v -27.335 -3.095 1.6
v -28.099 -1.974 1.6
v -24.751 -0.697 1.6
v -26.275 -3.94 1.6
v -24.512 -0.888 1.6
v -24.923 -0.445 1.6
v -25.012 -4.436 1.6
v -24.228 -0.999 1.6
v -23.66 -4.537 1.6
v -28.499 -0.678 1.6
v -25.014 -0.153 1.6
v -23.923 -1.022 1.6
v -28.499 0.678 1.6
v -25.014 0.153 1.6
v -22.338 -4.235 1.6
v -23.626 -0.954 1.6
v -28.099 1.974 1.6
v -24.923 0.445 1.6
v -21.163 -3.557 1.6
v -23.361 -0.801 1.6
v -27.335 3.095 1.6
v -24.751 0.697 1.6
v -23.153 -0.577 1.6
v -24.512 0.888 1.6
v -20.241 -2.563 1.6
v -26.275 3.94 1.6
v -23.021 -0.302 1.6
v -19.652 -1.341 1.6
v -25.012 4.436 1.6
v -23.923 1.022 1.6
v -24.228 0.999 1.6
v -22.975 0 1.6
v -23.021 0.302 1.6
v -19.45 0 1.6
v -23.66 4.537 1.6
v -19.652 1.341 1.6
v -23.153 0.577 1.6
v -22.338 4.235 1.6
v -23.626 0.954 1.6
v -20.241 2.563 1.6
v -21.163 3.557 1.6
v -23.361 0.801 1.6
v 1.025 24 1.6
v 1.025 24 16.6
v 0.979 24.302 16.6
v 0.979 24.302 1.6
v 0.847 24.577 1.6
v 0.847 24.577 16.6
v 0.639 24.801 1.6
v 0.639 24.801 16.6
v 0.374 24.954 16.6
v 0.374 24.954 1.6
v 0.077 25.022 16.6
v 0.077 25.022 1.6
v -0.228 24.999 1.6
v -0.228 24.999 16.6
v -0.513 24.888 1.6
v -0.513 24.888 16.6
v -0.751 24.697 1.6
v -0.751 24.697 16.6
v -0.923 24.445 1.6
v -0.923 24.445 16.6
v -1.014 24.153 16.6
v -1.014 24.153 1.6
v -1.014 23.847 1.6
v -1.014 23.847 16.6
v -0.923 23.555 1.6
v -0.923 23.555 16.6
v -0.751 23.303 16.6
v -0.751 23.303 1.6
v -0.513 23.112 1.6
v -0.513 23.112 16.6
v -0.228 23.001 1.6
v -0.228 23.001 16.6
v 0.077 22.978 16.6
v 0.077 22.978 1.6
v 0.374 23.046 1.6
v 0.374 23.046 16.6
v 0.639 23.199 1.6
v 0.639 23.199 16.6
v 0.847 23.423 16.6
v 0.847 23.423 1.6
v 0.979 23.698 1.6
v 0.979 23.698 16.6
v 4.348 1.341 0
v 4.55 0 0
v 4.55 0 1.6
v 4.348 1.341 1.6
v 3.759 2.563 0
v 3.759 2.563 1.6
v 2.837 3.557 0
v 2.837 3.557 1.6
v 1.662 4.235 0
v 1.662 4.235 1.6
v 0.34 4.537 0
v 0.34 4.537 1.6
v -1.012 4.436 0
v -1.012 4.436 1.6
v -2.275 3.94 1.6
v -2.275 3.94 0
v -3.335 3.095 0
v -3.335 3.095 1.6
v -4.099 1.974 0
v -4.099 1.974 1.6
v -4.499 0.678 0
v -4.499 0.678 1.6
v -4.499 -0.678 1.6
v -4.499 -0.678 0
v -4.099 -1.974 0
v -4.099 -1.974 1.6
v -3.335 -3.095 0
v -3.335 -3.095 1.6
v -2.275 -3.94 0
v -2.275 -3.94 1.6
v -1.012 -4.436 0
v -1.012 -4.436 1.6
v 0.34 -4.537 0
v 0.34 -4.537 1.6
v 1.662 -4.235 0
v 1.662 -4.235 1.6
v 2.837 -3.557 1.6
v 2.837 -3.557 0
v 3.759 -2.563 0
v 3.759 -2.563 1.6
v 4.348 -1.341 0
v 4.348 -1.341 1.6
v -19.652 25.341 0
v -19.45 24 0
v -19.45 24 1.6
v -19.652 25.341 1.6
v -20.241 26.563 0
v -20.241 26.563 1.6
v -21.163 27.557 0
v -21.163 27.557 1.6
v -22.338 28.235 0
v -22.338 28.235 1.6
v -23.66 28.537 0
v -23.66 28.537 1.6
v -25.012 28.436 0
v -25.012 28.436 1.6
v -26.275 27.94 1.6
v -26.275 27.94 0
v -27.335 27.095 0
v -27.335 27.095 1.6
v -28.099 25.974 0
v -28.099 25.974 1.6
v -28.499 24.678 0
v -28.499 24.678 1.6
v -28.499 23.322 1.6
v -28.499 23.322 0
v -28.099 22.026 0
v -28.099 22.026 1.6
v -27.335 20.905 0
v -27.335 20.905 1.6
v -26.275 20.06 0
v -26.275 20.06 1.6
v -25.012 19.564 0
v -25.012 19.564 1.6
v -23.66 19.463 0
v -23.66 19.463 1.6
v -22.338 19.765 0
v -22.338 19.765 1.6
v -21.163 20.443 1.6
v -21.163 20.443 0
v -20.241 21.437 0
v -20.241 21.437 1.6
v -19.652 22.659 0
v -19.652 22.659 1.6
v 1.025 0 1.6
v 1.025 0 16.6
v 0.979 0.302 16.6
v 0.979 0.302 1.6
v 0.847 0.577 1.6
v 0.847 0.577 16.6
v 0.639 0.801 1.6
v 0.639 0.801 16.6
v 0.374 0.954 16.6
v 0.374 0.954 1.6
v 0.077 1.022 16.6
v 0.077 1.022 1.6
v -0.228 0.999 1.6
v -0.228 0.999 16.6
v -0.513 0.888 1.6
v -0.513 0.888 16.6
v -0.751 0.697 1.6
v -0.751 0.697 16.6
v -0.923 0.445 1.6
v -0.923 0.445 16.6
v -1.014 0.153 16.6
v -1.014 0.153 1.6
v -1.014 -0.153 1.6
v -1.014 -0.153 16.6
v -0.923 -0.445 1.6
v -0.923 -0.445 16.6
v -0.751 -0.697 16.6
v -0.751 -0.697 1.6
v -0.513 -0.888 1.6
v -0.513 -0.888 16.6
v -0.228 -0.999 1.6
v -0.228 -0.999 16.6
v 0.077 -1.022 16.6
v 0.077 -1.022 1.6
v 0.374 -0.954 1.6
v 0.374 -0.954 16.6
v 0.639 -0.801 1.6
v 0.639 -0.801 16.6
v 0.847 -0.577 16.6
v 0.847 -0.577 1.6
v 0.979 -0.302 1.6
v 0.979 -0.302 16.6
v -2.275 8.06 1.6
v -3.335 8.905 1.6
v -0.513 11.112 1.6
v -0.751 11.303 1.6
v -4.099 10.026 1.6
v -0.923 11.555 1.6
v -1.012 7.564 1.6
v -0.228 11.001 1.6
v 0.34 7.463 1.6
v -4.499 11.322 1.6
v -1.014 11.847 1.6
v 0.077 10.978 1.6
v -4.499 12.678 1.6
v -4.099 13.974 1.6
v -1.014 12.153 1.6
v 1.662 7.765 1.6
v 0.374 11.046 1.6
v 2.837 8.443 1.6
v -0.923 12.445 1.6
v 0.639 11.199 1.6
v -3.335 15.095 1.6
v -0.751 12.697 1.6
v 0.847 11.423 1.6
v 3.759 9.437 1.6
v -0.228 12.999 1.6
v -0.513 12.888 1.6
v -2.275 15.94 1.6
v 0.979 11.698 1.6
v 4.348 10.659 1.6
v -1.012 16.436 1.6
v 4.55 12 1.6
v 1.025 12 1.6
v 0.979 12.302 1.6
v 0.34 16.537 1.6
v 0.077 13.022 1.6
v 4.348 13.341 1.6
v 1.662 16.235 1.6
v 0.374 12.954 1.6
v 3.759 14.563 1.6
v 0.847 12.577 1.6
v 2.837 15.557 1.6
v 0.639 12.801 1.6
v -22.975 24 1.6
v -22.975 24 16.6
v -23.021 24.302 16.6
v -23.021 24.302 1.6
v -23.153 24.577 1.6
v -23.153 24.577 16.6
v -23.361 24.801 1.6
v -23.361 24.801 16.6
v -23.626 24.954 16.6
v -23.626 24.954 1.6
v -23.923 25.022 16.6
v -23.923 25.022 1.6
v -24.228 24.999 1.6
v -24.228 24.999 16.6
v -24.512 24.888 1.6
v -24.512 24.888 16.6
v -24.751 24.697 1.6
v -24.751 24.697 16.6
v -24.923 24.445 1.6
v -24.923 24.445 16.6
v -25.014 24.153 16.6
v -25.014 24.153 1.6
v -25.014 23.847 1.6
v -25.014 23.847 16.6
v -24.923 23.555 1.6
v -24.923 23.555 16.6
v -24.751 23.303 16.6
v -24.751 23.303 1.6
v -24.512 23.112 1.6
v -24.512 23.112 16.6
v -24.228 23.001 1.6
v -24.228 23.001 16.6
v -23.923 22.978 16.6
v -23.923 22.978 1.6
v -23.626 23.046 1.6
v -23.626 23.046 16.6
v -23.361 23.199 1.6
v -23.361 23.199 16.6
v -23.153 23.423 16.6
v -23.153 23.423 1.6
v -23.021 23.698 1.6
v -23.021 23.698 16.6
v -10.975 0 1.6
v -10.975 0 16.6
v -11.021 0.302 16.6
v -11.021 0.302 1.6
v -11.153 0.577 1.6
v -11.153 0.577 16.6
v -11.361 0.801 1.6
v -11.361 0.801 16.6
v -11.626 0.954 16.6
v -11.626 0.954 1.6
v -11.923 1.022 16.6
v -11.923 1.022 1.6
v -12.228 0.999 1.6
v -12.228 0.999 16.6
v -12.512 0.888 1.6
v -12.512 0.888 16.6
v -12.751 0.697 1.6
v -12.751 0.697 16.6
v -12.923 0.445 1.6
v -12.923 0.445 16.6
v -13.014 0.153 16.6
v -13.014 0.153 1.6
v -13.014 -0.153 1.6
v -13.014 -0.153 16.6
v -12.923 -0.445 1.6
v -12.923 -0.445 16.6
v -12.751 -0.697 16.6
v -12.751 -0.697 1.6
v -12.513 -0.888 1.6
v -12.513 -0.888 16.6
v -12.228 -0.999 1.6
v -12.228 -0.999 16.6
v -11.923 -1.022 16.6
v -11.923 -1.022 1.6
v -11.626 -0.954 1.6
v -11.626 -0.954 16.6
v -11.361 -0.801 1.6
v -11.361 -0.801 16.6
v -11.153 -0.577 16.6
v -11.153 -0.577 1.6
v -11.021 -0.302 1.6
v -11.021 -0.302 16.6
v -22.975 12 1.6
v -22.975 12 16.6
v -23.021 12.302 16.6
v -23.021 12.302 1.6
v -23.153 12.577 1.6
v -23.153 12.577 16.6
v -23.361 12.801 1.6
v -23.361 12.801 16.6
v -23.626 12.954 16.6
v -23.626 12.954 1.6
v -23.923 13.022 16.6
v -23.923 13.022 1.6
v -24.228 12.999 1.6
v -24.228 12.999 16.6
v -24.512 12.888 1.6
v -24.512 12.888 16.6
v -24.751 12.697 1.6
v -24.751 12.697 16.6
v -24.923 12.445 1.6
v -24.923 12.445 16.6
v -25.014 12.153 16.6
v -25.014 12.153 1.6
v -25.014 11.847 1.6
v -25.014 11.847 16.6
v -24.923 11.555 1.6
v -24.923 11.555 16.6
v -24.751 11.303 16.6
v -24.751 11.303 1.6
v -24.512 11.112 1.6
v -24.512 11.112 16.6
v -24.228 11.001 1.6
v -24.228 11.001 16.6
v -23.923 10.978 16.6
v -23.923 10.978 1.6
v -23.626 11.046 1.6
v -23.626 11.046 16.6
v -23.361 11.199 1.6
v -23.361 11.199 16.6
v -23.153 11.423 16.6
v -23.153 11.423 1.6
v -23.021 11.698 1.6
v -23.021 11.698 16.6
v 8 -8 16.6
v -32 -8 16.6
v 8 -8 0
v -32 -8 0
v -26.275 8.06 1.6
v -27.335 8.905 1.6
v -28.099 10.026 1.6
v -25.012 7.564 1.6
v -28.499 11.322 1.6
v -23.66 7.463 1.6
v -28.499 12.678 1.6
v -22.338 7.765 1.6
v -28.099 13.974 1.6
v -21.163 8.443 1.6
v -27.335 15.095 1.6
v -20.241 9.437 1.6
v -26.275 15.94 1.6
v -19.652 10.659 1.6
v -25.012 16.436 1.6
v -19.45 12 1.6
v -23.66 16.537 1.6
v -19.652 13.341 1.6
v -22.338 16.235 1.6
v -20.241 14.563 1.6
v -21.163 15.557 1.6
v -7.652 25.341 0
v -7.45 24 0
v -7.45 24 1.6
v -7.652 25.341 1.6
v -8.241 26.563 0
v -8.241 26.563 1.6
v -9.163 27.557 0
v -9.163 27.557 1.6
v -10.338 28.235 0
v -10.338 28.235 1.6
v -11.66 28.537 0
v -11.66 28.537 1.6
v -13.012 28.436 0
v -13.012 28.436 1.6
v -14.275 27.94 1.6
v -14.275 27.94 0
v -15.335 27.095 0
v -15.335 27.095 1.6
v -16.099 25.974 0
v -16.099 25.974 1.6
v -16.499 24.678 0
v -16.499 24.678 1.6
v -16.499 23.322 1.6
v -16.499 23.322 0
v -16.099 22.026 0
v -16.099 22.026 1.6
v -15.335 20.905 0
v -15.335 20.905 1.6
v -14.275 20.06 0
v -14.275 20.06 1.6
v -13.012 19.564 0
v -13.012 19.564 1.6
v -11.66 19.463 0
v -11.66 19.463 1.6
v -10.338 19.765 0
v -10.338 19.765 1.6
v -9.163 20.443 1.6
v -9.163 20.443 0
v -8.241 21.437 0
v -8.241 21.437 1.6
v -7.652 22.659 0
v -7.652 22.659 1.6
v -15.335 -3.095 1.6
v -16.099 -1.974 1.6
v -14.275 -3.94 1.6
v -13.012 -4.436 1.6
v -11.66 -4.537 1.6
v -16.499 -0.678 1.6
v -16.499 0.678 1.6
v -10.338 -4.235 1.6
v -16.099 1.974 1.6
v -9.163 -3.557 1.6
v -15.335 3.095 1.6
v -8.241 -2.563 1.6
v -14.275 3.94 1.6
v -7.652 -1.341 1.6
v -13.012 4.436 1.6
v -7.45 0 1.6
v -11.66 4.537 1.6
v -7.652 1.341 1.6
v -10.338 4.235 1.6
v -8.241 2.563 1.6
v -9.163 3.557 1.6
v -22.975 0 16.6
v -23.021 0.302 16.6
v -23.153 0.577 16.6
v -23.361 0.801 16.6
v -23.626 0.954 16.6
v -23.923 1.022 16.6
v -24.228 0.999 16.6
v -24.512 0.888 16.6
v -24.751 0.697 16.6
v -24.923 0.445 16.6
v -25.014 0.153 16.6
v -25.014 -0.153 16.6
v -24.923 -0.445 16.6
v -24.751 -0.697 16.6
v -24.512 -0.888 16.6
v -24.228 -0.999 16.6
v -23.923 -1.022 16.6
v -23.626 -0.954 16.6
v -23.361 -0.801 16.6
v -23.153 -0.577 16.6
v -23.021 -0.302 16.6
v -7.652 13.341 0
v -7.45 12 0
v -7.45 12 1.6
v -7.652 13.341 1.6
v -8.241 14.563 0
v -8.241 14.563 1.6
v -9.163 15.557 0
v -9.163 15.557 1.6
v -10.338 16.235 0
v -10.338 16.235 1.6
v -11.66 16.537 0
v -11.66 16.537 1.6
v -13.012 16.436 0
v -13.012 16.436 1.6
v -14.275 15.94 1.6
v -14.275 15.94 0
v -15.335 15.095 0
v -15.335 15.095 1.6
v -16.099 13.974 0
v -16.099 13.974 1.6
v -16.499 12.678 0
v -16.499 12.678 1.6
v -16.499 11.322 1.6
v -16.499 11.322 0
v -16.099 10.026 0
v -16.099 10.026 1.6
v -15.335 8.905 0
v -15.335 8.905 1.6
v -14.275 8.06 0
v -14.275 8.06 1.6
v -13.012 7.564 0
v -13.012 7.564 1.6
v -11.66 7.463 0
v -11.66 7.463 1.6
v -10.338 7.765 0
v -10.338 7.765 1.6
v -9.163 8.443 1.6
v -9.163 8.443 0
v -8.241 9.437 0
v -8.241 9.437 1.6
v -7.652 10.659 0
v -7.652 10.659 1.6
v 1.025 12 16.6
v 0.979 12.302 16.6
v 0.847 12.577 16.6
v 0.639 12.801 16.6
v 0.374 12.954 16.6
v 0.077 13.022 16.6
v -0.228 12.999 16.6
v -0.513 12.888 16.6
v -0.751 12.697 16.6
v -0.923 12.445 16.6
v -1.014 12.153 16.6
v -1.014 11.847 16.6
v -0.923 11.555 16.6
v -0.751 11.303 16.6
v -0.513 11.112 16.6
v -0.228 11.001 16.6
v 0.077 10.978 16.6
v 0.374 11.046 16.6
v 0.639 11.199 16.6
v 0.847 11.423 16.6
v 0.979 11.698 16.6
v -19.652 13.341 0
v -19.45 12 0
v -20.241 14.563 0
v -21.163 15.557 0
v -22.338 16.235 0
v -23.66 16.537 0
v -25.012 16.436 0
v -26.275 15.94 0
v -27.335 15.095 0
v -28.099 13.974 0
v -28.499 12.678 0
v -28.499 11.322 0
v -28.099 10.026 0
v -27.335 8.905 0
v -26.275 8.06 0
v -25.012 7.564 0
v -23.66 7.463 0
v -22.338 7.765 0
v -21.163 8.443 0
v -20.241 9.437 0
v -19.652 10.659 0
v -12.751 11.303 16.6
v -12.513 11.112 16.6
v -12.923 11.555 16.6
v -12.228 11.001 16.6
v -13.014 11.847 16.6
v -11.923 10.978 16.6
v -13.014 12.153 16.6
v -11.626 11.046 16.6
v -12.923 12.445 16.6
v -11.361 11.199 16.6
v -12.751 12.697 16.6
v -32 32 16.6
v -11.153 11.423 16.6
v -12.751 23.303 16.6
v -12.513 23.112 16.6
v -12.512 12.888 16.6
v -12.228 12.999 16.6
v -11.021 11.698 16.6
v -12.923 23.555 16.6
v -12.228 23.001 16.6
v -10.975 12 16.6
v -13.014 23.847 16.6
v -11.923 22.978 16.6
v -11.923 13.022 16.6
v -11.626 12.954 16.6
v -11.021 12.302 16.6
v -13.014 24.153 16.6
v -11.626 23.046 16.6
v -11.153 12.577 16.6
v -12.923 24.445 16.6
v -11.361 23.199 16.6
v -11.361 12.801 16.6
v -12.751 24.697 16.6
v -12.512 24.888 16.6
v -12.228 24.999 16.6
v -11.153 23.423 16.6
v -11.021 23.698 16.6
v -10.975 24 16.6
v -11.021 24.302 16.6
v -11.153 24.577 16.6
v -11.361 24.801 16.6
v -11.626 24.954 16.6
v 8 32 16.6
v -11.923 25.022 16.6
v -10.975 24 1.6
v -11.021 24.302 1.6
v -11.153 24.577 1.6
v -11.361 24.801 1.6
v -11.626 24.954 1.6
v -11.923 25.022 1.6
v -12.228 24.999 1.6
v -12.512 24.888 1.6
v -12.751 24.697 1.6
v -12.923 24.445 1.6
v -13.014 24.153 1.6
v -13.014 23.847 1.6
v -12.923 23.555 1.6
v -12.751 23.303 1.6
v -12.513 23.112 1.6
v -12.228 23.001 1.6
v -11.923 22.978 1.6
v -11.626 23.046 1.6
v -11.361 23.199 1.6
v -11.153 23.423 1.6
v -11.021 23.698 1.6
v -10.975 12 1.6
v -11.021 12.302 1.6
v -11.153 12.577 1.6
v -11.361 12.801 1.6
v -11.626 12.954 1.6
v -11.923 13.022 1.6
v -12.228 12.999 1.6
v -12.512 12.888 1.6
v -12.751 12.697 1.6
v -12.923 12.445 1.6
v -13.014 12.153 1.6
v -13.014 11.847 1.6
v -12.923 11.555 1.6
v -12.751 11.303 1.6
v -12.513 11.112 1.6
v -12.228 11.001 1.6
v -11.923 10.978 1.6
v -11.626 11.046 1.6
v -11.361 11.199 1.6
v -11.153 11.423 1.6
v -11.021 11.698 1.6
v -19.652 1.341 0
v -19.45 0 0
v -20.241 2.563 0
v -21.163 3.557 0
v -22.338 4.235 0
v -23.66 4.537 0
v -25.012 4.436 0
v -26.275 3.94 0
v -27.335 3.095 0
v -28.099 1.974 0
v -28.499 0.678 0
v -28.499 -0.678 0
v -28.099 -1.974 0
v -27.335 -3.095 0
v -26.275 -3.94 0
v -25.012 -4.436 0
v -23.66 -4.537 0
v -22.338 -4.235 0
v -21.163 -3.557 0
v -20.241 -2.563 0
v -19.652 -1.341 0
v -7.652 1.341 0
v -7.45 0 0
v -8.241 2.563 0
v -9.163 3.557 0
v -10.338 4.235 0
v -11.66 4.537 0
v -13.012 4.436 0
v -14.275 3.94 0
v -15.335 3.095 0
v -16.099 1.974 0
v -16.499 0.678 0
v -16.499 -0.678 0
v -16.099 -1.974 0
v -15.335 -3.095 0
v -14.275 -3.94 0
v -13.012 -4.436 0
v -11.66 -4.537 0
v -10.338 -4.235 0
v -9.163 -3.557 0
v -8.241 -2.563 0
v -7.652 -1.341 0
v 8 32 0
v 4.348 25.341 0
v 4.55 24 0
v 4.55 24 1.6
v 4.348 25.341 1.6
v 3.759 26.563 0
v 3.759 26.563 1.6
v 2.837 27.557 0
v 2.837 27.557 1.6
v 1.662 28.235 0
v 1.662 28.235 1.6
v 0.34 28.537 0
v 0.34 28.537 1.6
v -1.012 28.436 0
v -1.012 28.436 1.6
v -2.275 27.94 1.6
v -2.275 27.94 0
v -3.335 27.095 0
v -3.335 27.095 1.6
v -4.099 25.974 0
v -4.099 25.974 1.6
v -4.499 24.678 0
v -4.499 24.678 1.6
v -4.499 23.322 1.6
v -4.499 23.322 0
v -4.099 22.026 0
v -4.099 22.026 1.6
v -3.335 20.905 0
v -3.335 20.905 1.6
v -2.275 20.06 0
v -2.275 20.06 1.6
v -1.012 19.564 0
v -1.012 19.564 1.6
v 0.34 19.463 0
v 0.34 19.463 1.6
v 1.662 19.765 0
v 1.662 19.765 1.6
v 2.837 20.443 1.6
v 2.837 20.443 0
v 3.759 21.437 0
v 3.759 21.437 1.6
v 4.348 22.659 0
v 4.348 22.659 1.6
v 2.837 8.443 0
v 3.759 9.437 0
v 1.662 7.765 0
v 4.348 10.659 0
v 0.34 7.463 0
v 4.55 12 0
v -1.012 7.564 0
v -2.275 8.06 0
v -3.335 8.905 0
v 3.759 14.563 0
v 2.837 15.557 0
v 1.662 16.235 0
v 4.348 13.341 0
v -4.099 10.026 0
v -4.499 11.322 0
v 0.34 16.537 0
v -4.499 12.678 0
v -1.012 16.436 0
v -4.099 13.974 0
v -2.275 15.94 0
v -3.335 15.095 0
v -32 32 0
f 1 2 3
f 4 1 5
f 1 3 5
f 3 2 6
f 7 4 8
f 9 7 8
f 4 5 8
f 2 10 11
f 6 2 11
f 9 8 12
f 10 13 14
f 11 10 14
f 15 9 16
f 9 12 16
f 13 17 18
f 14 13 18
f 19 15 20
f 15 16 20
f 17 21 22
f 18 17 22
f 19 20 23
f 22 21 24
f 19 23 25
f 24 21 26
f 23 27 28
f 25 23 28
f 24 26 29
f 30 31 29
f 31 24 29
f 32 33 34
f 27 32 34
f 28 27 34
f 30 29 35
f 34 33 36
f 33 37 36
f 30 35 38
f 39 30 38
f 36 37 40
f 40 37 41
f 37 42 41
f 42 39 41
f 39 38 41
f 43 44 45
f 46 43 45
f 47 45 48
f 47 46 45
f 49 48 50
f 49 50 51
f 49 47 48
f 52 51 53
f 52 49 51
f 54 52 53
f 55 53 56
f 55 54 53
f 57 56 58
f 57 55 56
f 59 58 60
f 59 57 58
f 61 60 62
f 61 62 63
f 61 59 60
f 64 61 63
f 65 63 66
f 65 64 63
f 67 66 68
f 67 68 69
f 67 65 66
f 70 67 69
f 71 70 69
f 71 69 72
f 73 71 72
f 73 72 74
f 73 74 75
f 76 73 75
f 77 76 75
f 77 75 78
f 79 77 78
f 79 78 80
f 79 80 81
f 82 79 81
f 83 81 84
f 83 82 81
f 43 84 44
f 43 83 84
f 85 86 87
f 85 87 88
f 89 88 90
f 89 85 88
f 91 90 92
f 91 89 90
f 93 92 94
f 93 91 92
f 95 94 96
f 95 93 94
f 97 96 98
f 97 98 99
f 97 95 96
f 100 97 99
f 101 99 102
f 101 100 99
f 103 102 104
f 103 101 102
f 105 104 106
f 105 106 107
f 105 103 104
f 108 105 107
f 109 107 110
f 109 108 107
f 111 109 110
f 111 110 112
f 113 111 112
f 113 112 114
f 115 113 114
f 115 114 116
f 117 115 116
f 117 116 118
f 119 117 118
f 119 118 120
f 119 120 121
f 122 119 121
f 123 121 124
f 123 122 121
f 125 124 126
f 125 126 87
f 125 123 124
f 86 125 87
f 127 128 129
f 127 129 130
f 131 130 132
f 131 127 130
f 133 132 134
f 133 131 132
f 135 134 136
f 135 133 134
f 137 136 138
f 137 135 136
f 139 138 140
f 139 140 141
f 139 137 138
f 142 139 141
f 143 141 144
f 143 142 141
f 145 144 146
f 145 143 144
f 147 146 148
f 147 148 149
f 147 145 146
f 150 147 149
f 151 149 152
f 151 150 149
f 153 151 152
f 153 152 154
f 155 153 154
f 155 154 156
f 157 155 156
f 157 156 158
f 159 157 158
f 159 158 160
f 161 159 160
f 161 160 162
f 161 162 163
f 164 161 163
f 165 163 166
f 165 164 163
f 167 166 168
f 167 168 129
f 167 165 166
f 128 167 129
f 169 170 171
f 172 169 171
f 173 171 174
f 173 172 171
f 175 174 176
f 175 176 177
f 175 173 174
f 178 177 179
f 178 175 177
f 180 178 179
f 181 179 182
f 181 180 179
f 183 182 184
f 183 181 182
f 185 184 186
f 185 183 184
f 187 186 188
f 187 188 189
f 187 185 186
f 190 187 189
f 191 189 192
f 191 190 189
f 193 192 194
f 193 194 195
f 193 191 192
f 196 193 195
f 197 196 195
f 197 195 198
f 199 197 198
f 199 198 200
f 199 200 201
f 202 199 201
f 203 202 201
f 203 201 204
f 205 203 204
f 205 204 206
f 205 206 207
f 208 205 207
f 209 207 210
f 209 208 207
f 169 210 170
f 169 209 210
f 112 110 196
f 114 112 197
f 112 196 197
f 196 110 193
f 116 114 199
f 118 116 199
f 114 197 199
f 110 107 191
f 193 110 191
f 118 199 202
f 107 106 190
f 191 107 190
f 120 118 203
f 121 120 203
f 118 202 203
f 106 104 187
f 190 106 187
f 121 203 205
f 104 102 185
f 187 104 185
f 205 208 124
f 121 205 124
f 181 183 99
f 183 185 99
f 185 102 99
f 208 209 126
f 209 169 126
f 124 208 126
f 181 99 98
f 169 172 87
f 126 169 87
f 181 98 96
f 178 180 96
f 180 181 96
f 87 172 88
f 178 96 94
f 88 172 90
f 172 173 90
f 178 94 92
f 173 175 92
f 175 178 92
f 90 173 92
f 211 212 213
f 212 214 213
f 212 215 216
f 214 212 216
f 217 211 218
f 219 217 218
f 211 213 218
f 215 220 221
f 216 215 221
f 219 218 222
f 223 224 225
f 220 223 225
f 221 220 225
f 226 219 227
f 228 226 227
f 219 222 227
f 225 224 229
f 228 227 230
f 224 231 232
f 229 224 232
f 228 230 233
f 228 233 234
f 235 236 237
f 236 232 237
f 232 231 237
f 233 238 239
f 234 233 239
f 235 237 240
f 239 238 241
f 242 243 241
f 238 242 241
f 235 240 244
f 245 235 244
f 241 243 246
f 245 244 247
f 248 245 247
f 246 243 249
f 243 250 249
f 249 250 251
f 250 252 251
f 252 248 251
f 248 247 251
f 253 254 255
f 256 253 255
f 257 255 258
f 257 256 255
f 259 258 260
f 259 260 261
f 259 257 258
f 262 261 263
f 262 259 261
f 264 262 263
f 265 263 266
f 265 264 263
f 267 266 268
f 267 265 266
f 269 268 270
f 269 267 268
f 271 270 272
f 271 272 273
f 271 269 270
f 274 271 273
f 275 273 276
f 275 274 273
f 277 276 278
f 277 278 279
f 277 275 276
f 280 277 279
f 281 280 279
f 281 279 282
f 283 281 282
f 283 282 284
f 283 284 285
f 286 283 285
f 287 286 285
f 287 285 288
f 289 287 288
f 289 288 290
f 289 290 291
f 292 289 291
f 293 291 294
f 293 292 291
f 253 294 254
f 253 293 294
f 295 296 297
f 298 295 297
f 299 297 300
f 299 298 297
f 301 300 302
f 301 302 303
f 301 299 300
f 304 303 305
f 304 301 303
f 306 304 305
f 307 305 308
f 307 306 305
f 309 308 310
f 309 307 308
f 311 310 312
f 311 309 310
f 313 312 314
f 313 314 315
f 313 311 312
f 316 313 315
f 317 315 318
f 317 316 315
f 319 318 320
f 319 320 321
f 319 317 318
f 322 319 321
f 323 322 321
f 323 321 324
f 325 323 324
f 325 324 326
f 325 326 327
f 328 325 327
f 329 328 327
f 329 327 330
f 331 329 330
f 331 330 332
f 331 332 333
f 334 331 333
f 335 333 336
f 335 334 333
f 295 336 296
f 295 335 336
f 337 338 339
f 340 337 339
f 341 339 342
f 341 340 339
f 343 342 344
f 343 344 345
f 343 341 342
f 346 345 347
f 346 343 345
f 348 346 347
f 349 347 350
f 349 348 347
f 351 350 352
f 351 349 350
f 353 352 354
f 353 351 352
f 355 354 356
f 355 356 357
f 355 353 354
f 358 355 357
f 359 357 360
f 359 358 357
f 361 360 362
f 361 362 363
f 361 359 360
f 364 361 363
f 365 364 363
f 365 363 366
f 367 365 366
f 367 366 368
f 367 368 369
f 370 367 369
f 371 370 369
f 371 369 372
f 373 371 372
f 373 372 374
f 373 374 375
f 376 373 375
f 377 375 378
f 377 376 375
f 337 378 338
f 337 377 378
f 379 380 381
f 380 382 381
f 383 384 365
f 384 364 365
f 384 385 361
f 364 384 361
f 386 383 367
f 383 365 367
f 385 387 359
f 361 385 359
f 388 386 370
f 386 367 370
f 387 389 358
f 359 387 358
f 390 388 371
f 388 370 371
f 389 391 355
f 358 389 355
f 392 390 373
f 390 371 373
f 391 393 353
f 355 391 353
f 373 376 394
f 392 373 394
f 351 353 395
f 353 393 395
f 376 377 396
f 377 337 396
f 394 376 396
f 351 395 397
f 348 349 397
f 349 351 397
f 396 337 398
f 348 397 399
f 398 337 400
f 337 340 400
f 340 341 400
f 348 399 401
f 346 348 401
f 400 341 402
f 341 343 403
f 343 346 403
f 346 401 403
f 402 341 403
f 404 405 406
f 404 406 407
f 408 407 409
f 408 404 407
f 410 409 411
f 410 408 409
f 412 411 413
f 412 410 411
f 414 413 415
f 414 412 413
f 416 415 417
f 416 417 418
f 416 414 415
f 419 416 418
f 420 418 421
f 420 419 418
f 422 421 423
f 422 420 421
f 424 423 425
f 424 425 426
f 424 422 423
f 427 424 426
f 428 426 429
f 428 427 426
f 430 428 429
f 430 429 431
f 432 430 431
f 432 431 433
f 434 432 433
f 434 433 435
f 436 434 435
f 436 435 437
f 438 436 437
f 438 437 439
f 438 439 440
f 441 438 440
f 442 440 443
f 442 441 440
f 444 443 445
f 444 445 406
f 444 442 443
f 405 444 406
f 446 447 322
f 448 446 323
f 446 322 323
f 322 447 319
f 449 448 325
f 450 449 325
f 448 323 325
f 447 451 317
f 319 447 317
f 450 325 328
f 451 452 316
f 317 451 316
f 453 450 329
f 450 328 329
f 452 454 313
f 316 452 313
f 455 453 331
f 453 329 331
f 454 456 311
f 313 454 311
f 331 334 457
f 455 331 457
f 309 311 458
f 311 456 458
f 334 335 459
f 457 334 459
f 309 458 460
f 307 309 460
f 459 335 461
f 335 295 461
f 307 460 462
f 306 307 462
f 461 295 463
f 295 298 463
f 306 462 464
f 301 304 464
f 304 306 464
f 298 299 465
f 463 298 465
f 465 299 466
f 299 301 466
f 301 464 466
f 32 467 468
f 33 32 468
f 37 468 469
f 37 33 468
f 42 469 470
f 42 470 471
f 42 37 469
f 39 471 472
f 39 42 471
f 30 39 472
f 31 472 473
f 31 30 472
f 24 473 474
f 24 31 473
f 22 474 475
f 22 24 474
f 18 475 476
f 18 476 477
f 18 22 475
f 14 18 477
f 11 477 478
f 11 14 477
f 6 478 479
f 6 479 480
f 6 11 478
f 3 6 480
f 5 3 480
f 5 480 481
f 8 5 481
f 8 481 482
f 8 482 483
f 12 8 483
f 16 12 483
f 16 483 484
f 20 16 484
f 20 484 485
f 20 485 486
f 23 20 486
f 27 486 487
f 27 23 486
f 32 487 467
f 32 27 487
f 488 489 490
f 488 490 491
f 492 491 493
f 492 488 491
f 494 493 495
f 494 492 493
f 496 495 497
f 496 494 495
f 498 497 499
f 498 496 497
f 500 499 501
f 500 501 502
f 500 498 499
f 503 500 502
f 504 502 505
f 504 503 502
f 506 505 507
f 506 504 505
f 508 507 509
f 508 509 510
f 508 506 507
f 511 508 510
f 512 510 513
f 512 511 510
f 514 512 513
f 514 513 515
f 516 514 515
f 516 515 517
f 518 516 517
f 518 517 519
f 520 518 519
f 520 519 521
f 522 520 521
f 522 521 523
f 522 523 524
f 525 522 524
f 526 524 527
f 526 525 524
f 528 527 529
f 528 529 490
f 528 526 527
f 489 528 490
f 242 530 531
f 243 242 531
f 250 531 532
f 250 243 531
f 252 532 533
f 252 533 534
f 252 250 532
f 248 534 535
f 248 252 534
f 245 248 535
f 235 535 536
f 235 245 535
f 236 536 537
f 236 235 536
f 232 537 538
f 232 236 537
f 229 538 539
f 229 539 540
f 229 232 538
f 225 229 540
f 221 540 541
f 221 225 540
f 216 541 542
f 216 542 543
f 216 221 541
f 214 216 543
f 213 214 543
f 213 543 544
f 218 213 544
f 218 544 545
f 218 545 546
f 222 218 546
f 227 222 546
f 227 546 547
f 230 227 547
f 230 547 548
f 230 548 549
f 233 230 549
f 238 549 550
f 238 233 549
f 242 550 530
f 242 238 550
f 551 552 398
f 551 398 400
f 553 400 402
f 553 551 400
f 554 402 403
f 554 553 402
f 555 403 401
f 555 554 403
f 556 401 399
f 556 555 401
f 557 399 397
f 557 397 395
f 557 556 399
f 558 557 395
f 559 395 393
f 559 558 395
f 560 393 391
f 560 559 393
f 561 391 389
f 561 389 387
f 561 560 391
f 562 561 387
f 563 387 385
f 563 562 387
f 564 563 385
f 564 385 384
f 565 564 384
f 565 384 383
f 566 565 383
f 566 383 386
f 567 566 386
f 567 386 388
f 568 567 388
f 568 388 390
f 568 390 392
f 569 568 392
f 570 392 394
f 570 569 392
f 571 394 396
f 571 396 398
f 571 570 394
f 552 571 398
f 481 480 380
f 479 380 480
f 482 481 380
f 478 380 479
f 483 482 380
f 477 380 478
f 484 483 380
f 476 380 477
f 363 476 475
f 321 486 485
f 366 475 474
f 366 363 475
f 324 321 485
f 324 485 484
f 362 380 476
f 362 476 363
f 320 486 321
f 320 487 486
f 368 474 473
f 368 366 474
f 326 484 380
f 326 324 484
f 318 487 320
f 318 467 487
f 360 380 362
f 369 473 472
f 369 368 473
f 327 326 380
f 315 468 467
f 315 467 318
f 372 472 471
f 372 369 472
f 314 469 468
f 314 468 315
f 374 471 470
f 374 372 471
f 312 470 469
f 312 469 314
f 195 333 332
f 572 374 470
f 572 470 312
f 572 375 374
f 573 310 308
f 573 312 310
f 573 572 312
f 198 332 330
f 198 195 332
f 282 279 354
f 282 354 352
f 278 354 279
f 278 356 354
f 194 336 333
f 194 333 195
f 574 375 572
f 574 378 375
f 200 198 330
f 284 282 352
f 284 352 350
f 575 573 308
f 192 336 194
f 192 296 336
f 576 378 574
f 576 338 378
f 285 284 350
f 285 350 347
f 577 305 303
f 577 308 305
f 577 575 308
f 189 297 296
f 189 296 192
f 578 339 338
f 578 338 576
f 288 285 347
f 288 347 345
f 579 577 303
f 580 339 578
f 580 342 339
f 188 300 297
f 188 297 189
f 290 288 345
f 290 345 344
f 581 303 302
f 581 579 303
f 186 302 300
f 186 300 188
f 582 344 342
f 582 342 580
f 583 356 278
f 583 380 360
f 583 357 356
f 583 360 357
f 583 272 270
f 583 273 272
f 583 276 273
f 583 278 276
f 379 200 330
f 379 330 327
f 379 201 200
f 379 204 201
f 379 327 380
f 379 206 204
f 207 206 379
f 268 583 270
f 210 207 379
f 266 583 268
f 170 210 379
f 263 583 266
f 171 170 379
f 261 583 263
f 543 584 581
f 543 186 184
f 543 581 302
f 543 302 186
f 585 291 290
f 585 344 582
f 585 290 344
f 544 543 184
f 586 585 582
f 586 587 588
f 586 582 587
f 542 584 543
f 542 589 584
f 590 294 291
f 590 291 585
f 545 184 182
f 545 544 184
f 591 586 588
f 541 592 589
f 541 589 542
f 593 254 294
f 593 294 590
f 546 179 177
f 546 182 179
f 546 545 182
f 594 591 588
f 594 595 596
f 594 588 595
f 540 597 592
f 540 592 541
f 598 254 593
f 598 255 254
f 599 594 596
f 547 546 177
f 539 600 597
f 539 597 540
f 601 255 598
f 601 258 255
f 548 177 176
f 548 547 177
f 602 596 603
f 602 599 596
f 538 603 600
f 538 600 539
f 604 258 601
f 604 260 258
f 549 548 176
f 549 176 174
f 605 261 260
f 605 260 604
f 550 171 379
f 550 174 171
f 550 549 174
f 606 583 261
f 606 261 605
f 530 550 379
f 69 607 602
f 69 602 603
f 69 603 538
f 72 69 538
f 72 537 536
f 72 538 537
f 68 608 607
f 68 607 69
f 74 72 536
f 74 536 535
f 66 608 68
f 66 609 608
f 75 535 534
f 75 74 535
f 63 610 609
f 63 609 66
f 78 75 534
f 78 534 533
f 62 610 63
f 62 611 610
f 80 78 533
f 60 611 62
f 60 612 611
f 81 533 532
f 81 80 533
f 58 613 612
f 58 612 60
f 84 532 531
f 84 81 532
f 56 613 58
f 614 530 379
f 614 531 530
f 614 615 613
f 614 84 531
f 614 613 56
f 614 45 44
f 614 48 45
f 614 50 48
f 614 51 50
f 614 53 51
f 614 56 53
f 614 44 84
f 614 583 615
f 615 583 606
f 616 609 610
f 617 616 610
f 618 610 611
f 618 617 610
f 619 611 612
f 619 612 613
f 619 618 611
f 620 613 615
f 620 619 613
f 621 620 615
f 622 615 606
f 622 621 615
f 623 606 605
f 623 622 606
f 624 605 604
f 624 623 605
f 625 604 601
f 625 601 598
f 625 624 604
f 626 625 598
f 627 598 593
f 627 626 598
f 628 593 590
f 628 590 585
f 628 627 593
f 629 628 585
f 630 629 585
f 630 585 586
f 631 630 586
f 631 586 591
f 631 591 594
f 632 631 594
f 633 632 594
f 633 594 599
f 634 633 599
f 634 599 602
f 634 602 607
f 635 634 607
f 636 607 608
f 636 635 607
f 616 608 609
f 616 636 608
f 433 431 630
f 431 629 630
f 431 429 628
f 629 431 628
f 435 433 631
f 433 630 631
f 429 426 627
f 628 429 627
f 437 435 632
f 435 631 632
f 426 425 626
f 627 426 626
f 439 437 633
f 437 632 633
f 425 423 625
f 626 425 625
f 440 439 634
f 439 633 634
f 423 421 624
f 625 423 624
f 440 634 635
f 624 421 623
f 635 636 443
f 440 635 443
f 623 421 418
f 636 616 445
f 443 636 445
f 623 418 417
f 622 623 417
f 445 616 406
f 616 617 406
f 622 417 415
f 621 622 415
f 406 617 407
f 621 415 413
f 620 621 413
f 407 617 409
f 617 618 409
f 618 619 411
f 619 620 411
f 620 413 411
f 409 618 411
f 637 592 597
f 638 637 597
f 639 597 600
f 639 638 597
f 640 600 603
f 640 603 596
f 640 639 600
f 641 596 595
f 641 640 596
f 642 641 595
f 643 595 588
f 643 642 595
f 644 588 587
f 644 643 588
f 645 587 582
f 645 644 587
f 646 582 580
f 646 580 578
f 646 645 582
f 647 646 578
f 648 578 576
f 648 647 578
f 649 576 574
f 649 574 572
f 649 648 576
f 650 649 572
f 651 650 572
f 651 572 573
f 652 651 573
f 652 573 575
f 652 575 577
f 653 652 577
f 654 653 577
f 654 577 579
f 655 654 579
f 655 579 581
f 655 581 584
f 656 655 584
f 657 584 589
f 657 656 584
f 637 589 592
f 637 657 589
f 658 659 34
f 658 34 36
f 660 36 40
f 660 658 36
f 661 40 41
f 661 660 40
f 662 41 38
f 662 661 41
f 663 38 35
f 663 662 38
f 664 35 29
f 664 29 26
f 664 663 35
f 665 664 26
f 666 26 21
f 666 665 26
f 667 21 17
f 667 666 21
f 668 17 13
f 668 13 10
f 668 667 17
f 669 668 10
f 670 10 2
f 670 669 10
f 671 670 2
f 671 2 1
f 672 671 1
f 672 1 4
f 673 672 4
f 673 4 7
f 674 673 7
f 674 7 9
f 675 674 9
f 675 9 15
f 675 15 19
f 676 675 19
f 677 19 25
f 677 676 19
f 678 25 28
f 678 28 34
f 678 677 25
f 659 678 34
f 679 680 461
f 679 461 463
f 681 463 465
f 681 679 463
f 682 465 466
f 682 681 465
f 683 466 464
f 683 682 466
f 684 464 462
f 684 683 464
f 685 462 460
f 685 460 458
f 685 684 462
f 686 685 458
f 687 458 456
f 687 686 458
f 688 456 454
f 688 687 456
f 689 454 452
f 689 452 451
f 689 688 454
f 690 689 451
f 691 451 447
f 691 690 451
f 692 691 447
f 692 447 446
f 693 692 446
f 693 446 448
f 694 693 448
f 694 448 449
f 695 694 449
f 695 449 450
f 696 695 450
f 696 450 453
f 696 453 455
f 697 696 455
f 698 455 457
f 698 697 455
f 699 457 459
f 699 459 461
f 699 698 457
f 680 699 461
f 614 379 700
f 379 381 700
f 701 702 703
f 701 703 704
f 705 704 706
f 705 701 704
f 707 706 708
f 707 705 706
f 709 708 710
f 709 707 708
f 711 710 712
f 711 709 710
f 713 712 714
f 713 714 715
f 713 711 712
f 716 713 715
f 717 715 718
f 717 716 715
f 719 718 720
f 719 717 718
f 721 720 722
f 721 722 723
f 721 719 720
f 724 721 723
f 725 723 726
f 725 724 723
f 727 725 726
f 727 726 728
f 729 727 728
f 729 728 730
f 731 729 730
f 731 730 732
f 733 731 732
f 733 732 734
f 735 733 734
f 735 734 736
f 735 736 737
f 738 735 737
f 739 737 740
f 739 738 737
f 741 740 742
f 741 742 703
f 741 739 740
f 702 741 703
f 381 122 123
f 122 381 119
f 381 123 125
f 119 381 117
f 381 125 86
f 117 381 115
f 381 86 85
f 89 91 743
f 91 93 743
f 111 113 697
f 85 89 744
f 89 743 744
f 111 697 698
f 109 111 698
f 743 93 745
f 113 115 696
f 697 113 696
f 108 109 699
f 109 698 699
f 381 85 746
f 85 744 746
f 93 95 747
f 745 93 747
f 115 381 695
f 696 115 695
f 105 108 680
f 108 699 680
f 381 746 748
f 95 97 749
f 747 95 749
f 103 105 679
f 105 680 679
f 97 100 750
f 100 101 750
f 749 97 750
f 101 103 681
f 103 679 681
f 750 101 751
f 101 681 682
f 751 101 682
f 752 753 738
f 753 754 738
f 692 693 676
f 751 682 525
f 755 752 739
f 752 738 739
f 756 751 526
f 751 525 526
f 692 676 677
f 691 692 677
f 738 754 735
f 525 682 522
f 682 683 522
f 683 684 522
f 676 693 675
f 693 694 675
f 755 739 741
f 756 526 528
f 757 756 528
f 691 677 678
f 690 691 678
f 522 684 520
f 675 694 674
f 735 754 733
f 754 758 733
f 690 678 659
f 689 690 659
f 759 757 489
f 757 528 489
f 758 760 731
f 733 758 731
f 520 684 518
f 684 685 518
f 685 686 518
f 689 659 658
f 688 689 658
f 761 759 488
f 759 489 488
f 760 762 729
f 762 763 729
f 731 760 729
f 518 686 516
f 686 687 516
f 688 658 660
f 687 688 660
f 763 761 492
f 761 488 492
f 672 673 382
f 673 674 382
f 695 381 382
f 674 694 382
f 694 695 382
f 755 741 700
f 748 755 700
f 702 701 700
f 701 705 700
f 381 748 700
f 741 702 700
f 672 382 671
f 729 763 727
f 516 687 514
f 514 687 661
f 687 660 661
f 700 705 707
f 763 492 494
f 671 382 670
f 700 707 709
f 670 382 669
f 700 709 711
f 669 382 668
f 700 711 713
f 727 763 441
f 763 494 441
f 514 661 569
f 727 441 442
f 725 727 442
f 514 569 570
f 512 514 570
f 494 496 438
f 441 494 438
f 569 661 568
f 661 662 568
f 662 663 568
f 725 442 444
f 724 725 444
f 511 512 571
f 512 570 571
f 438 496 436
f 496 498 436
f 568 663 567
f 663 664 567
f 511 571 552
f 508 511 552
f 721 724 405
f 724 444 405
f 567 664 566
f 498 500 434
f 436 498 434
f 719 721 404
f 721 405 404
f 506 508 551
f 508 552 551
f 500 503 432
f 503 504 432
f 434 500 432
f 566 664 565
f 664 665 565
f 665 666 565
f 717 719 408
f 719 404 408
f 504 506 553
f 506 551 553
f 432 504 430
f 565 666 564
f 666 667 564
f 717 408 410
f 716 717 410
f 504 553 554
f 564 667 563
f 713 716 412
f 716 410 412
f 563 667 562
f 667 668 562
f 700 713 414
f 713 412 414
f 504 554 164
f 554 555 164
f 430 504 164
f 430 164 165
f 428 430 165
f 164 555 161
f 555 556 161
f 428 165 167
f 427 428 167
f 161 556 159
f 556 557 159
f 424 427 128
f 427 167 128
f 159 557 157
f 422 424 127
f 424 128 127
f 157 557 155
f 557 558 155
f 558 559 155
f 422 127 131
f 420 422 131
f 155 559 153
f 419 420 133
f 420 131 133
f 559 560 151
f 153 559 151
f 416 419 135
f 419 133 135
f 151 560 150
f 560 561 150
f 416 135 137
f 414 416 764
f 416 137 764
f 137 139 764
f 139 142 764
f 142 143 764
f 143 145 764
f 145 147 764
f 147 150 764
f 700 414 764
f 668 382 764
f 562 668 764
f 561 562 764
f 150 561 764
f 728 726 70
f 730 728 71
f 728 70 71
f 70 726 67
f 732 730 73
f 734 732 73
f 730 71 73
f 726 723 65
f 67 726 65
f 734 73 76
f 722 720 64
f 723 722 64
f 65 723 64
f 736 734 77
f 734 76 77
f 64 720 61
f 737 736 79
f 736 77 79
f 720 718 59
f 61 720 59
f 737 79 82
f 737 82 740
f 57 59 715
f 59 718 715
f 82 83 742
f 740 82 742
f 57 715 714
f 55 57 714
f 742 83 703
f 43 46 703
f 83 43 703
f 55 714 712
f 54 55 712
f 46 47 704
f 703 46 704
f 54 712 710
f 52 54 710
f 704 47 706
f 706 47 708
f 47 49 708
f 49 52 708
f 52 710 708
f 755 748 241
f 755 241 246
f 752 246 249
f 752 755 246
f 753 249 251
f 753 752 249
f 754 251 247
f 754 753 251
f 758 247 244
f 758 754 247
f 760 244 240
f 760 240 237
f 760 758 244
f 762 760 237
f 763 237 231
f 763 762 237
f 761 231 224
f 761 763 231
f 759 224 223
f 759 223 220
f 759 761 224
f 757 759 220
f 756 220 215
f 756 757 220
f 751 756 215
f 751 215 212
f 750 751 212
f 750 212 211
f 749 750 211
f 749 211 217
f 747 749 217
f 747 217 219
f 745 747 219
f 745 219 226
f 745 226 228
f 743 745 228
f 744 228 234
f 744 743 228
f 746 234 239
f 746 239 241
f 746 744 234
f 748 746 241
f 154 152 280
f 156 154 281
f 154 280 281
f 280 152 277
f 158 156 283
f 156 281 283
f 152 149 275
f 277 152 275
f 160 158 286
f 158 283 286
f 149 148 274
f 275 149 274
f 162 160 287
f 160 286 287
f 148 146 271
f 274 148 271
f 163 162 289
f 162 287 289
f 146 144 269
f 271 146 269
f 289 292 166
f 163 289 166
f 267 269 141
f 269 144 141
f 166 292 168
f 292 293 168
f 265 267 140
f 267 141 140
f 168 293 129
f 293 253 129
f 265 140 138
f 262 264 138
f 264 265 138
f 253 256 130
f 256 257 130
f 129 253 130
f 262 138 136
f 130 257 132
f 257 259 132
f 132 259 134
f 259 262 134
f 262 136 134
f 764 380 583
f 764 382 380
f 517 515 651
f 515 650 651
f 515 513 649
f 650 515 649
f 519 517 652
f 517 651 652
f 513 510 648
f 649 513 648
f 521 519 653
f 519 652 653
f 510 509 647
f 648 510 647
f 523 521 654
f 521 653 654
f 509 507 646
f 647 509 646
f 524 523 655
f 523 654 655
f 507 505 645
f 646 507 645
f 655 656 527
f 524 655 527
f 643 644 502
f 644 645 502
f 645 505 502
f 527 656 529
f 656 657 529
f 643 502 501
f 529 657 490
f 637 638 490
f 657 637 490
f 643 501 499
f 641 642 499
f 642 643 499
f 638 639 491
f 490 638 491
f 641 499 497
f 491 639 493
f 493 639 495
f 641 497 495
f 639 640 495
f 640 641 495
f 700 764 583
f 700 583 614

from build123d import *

# Parameters (mm, degrees)
SKETCH1_W           = 40
SKETCH1_H           = 40
SKETCH1_R           = 4.55
BOSS_EXTRUDE1_DEPTH = 1.6
SKETCH2_W           = 40
SKETCH2_H           = 40
SKETCH2_R           = 1.025
BOSS_EXTRUDE2_DEPTH = 15


with BuildPart() as part:
    # Sketch1 → Boss-Extrude1 (new body)
    with BuildSketch(Plane(origin=(0, 0, 0), x_dir=(0, 1, 0), z_dir=(0, 0, 1))):
        with Locations((12, 12)):
            Rectangle(SKETCH1_W, SKETCH1_H)
        with Locations(Location((0, 0, 0), (0, 0, 270))):
            Circle(SKETCH1_R, mode=Mode.SUBTRACT)
        with Locations(Location((12, 0, 0), (0, 0, 270))):
            Circle(SKETCH1_R, mode=Mode.SUBTRACT)
        with Locations(Location((24, 0, 0), (0, 0, 270))):
            Circle(SKETCH1_R, mode=Mode.SUBTRACT)
        with Locations(Location((12, 12, 0), (0, 0, 270))):
            Circle(SKETCH1_R, mode=Mode.SUBTRACT)
        with Locations(Location((24, 12, 0), (0, 0, 270))):
            Circle(SKETCH1_R, mode=Mode.SUBTRACT)
        with Locations(Location((12, 24, 0), (0, 0, 270))):
            Circle(SKETCH1_R, mode=Mode.SUBTRACT)
        with Locations(Location((24, 24, 0), (0, 0, 270))):
            Circle(SKETCH1_R, mode=Mode.SUBTRACT)
        with Locations(Location((0, 12, 0), (0, 0, 270))):
            Circle(SKETCH1_R, mode=Mode.SUBTRACT)
        with Locations(Location((0, 24, 0), (0, 0, 270))):
            Circle(SKETCH1_R, mode=Mode.SUBTRACT)
    extrude(amount=BOSS_EXTRUDE1_DEPTH)

    # Sketch2 → Boss-Extrude2 (add)
    with BuildSketch(Plane.XY.offset(1.6)):
        with Locations((-12, 12)):
            Rectangle(SKETCH2_W, SKETCH2_H)
        Circle(SKETCH2_R, mode=Mode.SUBTRACT)
        with Locations((-12, 0)):
            Circle(SKETCH2_R, mode=Mode.SUBTRACT)
        with Locations((-24, 0)):
            Circle(SKETCH2_R, mode=Mode.SUBTRACT)
        with Locations((-12, 12)):
            Circle(SKETCH2_R, mode=Mode.SUBTRACT)
        with Locations((-24, 12)):
            Circle(SKETCH2_R, mode=Mode.SUBTRACT)
        with Locations((-12, 24)):
            Circle(SKETCH2_R, mode=Mode.SUBTRACT)
        with Locations((-24, 24)):
            Circle(SKETCH2_R, mode=Mode.SUBTRACT)
        with Locations((0, 12)):
            Circle(SKETCH2_R, mode=Mode.SUBTRACT)
        with Locations((0, 24)):
            Circle(SKETCH2_R, mode=Mode.SUBTRACT)
    extrude(amount=BOSS_EXTRUDE2_DEPTH)


solid = part.part
